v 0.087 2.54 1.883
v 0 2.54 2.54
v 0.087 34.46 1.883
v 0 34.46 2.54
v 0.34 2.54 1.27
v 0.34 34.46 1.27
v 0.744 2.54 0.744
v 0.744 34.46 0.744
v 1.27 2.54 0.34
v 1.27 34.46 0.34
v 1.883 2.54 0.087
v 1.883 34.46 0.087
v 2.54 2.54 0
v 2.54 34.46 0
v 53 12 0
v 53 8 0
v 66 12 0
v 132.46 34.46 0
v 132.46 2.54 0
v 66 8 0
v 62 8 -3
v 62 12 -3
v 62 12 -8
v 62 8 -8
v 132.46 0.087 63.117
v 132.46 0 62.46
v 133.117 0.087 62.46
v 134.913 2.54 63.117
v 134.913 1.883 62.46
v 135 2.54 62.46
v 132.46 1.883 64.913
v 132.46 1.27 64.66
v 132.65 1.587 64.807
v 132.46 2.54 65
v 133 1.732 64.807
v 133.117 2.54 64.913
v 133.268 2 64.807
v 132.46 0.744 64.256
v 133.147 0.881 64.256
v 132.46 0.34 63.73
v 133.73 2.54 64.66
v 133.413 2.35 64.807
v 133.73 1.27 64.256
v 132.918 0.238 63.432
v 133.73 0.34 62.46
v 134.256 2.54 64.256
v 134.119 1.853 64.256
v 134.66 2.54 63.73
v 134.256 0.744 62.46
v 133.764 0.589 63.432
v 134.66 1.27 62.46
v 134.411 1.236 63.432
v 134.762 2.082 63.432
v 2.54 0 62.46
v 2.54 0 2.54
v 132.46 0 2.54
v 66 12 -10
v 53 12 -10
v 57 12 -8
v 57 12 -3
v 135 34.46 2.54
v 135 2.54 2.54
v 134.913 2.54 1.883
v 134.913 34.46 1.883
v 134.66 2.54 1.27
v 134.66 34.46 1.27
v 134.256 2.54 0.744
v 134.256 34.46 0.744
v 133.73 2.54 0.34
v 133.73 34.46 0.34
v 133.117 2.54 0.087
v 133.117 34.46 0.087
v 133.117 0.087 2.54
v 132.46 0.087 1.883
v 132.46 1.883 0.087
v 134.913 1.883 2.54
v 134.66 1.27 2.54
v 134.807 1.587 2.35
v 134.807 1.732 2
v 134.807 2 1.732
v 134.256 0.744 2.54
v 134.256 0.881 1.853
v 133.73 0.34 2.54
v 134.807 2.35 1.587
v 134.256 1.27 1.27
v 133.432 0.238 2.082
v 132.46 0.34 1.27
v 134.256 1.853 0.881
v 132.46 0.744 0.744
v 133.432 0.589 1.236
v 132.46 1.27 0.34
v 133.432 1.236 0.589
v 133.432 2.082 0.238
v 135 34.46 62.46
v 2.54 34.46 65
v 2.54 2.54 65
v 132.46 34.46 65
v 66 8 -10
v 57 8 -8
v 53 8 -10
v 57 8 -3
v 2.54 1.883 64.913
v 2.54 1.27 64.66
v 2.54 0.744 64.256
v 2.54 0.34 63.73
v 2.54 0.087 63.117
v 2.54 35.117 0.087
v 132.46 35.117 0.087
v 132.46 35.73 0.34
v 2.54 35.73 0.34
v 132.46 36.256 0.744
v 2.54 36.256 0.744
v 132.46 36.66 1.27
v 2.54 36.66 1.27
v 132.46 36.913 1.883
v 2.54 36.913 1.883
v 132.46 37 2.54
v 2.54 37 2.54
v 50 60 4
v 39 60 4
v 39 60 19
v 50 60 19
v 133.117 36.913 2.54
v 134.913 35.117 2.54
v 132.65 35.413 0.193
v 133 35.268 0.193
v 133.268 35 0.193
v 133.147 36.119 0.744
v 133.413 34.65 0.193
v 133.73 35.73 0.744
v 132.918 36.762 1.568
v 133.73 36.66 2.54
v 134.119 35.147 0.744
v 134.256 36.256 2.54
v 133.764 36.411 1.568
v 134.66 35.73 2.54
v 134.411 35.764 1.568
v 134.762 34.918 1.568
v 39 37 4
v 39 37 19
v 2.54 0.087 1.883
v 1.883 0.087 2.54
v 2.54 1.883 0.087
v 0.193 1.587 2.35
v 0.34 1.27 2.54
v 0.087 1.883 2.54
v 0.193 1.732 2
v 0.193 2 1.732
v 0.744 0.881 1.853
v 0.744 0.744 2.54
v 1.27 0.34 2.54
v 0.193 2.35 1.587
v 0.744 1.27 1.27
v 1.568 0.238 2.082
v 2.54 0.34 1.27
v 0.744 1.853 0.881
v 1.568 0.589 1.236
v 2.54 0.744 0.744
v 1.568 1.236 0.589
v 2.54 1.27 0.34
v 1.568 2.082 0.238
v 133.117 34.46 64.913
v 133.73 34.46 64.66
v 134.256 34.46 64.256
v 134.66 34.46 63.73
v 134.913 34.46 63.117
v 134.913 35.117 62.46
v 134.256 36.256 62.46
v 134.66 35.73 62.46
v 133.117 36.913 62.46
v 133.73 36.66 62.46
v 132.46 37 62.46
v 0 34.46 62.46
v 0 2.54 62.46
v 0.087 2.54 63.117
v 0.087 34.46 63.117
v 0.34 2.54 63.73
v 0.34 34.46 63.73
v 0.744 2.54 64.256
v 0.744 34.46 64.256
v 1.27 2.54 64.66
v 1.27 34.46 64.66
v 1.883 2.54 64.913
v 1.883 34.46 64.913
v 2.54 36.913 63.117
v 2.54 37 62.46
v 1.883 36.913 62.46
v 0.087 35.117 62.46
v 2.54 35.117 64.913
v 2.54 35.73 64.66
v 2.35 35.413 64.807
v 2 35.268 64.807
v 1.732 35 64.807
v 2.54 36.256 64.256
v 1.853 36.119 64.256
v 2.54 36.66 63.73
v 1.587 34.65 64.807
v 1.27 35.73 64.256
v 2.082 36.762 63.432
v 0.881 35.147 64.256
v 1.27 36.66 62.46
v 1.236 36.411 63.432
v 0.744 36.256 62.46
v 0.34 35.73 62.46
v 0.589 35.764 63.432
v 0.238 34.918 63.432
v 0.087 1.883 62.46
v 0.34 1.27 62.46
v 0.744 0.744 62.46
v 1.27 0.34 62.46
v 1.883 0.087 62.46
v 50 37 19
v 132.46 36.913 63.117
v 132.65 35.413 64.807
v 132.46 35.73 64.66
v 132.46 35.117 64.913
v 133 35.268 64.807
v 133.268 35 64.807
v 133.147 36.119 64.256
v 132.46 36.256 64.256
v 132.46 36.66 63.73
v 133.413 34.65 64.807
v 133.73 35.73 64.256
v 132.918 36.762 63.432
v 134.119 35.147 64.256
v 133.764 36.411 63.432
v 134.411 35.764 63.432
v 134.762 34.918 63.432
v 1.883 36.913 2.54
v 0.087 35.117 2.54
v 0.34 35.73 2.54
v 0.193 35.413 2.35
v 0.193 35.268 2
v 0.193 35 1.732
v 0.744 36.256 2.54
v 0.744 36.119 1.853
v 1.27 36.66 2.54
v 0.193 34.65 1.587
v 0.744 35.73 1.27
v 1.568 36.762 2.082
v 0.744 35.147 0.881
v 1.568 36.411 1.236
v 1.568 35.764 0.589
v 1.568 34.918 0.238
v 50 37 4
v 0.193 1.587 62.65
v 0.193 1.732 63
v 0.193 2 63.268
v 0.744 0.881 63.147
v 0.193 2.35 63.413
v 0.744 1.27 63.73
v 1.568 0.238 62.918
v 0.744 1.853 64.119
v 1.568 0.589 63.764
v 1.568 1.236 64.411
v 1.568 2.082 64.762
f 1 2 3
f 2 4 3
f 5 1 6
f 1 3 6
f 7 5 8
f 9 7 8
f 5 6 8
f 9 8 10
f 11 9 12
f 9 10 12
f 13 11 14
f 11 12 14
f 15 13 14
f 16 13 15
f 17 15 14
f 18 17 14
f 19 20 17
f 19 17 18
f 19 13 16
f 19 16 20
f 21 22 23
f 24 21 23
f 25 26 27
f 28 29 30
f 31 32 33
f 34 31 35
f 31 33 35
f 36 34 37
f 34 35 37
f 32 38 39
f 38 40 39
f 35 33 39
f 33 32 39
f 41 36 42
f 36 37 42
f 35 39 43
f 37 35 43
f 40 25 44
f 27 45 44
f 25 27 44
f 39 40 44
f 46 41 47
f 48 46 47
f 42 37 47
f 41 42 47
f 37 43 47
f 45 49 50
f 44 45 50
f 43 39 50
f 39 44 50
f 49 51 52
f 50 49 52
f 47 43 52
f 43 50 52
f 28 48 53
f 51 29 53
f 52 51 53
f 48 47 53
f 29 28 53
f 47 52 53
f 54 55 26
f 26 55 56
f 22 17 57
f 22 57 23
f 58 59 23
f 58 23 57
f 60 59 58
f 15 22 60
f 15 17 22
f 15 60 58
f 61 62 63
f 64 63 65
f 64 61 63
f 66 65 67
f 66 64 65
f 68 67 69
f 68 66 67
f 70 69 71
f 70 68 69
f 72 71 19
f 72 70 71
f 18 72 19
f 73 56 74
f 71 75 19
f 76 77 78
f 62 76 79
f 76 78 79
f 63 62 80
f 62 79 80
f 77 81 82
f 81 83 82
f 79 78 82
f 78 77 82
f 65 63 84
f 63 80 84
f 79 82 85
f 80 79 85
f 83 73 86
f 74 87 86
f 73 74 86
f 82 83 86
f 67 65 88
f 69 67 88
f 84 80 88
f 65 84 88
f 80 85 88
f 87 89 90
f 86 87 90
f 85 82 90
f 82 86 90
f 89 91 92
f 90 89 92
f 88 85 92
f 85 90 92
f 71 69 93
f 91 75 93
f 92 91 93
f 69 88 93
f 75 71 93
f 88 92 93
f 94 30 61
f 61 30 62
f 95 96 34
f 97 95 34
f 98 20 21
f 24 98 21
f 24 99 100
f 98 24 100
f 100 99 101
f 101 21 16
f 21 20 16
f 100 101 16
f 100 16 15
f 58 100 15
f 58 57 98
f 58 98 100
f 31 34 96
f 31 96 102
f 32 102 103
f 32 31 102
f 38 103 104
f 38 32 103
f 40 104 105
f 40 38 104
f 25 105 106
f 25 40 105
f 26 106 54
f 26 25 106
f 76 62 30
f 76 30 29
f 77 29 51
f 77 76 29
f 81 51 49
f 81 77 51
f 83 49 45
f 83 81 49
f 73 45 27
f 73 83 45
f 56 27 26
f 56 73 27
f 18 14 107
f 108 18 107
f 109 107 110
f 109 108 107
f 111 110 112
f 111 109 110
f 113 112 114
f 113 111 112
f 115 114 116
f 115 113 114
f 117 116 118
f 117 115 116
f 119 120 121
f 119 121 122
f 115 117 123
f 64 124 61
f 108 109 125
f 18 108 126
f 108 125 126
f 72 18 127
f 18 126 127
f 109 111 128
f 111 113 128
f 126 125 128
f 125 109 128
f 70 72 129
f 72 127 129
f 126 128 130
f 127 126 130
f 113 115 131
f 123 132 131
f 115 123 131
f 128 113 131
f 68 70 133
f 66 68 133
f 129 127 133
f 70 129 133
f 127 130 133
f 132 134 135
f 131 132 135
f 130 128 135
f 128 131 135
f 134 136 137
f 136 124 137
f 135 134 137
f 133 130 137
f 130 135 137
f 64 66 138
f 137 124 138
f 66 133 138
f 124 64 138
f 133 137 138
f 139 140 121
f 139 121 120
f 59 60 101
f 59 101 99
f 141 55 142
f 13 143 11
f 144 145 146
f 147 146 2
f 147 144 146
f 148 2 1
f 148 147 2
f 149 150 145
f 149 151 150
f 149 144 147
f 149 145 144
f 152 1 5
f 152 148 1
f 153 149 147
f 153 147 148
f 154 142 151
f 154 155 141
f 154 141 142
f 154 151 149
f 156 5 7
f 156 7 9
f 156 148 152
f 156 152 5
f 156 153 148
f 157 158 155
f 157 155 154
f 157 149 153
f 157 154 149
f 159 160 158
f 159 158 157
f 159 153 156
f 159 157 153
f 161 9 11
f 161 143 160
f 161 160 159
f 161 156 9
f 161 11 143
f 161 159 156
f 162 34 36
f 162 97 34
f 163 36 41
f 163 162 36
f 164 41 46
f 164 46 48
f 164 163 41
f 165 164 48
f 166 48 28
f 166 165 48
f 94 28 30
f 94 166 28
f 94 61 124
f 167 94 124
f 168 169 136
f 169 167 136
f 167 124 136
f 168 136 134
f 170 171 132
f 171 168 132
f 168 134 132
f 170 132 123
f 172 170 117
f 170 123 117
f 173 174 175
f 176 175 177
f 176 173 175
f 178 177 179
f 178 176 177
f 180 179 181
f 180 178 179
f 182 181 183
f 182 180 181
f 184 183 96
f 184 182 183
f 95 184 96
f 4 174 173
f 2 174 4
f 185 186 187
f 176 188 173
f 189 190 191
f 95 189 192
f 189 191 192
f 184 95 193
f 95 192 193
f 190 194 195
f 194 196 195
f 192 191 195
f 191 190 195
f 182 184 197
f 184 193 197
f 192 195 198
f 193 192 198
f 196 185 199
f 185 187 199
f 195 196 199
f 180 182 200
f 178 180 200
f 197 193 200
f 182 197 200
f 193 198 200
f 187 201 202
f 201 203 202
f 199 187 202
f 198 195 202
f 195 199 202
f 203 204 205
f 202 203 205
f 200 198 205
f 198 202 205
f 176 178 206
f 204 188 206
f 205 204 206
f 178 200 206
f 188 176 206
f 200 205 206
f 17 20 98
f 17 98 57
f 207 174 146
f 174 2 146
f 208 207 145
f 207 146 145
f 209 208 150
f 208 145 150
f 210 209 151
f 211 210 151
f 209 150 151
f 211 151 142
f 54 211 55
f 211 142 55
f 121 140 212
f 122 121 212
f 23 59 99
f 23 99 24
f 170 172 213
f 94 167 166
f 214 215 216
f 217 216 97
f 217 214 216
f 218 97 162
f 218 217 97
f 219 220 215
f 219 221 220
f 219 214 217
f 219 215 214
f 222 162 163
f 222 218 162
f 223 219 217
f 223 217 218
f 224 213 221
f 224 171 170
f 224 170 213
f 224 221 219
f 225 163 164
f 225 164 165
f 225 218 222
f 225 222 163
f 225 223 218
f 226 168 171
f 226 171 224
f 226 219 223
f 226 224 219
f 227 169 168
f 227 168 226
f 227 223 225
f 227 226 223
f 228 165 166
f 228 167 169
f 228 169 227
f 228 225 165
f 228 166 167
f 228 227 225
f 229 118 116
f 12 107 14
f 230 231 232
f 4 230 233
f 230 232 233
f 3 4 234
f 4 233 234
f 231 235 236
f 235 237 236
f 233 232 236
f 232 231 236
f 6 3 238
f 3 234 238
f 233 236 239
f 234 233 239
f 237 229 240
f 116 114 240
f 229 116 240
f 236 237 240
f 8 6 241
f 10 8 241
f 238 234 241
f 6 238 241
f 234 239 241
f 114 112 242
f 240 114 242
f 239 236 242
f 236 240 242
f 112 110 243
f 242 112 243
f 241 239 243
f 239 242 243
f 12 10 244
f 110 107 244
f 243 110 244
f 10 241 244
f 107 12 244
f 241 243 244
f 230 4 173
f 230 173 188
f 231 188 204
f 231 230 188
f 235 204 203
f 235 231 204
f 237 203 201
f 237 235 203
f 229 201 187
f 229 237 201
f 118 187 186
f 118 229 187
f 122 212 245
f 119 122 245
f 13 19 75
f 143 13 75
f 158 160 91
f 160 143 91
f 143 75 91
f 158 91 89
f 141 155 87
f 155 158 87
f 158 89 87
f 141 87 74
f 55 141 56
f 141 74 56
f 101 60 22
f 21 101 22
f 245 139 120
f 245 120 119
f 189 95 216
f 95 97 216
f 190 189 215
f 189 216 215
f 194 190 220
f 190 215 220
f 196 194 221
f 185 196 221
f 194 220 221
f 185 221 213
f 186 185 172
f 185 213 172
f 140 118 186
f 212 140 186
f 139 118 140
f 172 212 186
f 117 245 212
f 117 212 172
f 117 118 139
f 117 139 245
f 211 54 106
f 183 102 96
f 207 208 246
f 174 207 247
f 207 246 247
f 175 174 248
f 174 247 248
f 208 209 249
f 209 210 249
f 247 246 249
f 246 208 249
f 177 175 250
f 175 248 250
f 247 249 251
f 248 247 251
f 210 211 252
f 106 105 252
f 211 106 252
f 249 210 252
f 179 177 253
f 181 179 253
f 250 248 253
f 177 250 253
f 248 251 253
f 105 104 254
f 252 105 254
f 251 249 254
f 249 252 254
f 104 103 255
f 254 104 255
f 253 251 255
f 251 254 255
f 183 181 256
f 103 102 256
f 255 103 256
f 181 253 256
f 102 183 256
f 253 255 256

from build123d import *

# Parameters (mm, degrees)
SKETCH1_W           = 135
SKETCH1_H           = 65
BOSS_EXTRUDE1_DEPTH = 37
FILLET1_R           = 2.54
SKETCH2_W           = 11
SKETCH2_H           = 15
BOSS_EXTRUDE2_DEPTH = 23
SKETCH3_W           = 13
SKETCH3_H           = 4
BOSS_EXTRUDE3_DEPTH = 10
SKETCH4_W           = 5
SKETCH4_H           = 5
CUT_EXTRUDE1_DEPTH  = 158.334039546


with BuildPart() as part:
    # Sketch1 → Boss-Extrude1 (new body)
    with BuildSketch(Plane(origin=(0, 0, 0), x_dir=(1, 0, 0), z_dir=(0, 1, 0))):
        with Locations((67.5, -32.5)):
            Rectangle(SKETCH1_W, SKETCH1_H)
    extrude(amount=BOSS_EXTRUDE1_DEPTH)

    # Fillet1
    fillet1_edges = [part.edges().sort_by_distance(p)[0] for p in [
        (135, 37, 32.5),
        (67.5, 37, 0),
        (0, 37, 32.5),
        (67.5, 0, 0),
        (135, 0, 32.5),
        (67.5, 0, 65),
        (0, 0, 32.5),
        (67.5, 37, 65),
        (0, 18.5, 0),
        (135, 18.5, 0),
        (135, 18.5, 65),
        (0, 18.5, 65),
    ]]
    fillet(fillet1_edges, radius=FILLET1_R)

    # Sketch2 → Boss-Extrude2 (add)
    with BuildSketch(Plane(origin=(0, 37, 0), x_dir=(1, 0, 0), z_dir=(0, 1, 0))):
        with Locations((44.5, -11.5)):
            Rectangle(SKETCH2_W, SKETCH2_H)
    extrude(amount=BOSS_EXTRUDE2_DEPTH)

    # Sketch3 → Boss-Extrude3 (add)
    with BuildSketch(Plane(origin=(0, 0, 0), x_dir=(-1, 0, 0), z_dir=(0, 0, -1))):
        with Locations((-59.5, 10)):
            Rectangle(SKETCH3_W, SKETCH3_H)
    extrude(amount=BOSS_EXTRUDE3_DEPTH)

    # Sketch4 → Cut-Extrude1 (cut, through all)
    with BuildSketch(Plane(origin=(0, 12, 0), x_dir=(1, 0, 0), z_dir=(0, 1, 0))):
        with Locations((59.5, 5.5)):
            Rectangle(SKETCH4_W, SKETCH4_H)
    extrude(amount=-CUT_EXTRUDE1_DEPTH, mode=Mode.SUBTRACT)


solid = part.part
